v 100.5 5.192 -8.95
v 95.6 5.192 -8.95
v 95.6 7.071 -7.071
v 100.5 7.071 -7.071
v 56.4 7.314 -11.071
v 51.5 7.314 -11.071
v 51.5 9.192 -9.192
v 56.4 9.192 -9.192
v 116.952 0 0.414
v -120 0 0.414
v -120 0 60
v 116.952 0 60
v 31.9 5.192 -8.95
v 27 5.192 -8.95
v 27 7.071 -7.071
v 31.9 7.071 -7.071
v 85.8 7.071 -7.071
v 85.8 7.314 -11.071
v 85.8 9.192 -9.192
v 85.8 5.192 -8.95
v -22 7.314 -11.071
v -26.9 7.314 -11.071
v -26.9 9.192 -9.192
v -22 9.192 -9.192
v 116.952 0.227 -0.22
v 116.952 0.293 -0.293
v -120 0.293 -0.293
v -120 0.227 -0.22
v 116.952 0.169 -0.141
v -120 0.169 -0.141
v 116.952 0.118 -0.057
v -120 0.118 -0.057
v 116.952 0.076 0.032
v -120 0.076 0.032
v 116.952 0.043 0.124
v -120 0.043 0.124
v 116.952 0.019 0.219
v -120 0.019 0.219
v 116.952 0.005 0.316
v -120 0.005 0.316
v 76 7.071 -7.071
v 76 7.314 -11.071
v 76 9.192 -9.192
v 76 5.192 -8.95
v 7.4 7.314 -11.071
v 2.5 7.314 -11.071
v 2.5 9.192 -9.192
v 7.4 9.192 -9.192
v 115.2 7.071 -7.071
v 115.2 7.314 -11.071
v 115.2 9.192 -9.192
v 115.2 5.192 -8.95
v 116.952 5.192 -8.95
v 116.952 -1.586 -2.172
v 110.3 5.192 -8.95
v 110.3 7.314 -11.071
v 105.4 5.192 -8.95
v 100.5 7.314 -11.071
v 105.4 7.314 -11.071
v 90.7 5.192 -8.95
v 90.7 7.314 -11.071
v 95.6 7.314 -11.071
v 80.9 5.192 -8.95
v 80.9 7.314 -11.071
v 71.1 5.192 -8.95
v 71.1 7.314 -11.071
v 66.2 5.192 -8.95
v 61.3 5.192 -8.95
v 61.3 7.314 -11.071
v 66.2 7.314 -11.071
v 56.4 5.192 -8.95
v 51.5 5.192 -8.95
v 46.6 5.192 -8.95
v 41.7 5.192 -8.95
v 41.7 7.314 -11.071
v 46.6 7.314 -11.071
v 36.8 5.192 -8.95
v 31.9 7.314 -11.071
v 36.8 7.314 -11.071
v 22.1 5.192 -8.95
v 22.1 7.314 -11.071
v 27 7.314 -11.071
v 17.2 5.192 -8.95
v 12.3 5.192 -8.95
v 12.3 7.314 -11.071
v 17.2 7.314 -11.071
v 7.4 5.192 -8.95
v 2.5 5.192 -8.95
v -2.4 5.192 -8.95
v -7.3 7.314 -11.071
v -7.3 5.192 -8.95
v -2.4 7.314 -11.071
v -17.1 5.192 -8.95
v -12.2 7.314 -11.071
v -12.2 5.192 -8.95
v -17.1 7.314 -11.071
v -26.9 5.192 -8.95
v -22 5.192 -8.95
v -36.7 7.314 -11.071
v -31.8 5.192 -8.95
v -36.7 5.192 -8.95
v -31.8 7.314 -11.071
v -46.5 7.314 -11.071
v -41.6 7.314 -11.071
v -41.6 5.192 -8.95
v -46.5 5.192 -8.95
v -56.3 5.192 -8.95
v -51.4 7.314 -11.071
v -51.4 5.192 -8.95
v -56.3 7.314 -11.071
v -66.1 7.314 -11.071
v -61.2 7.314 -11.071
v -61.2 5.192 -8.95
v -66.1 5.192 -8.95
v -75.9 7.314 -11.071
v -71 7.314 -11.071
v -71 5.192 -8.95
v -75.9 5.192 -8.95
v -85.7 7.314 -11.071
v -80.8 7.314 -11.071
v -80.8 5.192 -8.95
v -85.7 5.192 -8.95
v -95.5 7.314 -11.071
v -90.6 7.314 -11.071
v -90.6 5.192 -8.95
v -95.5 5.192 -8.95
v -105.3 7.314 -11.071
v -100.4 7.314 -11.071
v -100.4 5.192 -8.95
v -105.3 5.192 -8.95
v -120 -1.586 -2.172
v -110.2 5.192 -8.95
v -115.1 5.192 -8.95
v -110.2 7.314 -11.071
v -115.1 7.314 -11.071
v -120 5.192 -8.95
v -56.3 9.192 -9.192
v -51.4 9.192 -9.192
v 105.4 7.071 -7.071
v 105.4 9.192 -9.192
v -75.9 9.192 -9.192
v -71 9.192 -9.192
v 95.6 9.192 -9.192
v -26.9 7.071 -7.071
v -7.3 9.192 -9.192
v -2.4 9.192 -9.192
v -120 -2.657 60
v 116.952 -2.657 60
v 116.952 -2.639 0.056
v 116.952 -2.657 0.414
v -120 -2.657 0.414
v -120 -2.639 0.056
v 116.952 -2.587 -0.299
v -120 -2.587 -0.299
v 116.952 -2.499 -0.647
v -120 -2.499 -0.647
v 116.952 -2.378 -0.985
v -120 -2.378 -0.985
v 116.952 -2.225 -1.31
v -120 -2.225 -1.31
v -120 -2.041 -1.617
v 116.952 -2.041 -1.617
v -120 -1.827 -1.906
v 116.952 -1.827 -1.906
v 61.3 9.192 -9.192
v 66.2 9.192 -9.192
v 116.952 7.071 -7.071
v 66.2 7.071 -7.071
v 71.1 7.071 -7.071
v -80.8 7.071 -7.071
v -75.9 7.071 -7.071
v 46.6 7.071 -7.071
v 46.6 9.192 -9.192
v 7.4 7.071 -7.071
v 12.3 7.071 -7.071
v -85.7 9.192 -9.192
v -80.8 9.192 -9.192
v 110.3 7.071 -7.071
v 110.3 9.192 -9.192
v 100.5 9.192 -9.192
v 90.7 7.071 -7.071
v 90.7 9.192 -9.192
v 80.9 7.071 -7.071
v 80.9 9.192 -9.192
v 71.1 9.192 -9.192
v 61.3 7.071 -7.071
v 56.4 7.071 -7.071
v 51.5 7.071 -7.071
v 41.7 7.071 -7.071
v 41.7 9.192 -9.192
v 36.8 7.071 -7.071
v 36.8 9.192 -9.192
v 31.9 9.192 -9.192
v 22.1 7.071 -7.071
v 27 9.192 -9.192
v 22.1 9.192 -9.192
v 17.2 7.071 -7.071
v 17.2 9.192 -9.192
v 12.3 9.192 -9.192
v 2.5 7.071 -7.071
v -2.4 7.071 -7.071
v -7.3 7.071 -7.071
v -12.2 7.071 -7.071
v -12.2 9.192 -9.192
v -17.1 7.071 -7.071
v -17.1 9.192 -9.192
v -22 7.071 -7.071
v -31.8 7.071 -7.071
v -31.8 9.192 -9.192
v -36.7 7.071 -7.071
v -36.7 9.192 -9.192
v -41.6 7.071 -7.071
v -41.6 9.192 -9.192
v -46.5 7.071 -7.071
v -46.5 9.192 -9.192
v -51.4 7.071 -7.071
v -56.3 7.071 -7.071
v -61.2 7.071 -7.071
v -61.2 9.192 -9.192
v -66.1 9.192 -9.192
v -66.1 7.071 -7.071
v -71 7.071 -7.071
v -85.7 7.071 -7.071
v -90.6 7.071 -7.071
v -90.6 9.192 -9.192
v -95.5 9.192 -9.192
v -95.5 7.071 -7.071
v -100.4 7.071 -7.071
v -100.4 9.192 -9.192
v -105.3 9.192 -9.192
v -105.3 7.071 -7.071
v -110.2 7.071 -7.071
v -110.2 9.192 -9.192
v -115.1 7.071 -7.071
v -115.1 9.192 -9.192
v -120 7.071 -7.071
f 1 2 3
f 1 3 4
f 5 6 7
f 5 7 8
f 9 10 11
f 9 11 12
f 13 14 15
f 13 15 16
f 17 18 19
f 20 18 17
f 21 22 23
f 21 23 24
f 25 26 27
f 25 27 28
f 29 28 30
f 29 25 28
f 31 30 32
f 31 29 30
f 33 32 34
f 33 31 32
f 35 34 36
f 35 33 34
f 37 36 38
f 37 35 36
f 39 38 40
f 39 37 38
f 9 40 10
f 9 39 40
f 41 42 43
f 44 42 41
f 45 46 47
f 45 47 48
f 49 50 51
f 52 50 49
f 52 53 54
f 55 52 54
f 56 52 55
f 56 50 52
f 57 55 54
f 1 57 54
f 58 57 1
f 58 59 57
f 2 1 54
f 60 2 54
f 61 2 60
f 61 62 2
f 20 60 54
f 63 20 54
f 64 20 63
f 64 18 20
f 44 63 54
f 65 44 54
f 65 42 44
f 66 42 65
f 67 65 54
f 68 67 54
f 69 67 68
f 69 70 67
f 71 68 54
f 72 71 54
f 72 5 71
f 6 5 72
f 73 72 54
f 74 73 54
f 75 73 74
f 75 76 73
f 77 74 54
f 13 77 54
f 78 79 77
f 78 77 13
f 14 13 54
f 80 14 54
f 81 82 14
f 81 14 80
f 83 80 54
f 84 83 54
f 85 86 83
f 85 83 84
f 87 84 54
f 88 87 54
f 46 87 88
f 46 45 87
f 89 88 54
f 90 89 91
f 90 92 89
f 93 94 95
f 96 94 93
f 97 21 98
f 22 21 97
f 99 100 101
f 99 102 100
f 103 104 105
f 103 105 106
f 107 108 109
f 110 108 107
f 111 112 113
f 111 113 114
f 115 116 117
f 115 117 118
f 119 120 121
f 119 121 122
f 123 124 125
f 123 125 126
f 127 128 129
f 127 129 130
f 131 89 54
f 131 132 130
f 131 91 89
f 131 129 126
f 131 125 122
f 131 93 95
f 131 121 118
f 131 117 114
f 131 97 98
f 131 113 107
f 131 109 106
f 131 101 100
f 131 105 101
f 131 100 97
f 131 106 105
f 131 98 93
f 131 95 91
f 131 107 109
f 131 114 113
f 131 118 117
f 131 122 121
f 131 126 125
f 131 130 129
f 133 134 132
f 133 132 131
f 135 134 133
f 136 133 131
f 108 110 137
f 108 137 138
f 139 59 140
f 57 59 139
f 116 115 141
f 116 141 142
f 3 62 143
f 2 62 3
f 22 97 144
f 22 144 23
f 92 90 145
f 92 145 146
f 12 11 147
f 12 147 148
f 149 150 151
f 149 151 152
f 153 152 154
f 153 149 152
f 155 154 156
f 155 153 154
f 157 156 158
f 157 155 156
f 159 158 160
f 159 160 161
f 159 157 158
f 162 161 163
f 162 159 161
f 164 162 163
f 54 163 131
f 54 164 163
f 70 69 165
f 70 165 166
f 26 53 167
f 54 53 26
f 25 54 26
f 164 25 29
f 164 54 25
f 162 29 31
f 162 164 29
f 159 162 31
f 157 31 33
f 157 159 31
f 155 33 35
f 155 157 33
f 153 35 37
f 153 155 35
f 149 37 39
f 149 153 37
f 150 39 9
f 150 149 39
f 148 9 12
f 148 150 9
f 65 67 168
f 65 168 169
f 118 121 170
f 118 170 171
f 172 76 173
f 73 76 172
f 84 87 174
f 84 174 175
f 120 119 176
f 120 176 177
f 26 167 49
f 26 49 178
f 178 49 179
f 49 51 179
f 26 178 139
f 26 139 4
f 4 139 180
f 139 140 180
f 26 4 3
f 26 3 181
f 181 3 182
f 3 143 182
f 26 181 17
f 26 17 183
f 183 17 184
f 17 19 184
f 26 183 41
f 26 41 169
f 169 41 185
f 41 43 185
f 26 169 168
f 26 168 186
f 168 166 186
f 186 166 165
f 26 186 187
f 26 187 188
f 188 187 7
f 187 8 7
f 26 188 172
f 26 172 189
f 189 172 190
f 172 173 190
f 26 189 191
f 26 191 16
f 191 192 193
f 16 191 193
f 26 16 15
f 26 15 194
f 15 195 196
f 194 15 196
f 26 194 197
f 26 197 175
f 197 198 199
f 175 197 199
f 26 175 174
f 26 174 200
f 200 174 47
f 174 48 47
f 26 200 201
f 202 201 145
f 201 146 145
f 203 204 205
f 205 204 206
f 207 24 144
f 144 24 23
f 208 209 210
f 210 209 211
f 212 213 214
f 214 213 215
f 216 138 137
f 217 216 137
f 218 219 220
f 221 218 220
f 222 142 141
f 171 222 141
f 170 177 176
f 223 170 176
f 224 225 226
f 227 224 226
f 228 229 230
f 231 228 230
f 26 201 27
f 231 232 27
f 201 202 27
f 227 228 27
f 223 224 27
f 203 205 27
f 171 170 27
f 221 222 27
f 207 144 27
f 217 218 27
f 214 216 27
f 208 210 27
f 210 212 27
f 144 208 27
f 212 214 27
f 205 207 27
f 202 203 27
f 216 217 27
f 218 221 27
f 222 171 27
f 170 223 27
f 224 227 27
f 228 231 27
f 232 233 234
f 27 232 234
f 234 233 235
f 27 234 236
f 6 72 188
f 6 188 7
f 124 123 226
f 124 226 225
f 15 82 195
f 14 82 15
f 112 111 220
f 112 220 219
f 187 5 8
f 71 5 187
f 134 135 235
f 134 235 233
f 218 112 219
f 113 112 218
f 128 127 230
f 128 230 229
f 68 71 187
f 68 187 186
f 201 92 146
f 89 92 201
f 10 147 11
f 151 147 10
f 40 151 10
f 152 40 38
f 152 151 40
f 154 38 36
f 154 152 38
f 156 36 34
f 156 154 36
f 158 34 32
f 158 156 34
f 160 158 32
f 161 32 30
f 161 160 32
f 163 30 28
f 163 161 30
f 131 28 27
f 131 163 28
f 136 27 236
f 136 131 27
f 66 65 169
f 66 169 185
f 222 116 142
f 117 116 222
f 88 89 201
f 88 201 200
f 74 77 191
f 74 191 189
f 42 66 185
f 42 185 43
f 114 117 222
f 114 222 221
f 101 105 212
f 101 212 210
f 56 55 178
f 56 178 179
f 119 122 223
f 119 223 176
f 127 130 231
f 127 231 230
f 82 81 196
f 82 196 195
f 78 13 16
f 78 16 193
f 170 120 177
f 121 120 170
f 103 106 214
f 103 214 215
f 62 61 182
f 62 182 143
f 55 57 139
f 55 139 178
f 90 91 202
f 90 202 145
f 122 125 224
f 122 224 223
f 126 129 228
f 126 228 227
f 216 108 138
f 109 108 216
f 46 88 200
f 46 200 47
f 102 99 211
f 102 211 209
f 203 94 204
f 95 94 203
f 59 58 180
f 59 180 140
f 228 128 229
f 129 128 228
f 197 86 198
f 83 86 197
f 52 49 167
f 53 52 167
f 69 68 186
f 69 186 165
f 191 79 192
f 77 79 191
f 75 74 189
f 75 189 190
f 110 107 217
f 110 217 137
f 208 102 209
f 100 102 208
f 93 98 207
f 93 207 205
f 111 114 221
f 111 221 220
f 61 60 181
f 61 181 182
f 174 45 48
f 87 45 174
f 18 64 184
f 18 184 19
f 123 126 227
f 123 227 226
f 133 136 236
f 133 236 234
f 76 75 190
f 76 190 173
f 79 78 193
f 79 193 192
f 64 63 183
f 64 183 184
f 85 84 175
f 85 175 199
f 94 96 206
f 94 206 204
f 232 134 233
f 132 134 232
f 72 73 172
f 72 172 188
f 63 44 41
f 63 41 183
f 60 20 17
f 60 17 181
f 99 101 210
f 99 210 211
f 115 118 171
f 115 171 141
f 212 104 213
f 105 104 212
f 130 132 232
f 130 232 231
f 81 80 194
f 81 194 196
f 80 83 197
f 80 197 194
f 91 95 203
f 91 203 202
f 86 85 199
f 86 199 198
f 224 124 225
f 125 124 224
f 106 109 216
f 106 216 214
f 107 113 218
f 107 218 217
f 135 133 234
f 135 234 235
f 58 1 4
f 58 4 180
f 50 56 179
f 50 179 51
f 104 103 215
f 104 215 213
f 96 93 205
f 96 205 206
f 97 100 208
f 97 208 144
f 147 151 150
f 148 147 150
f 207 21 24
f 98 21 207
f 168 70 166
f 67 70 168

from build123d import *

# Parameters (mm, degrees)
SKETCH1_W                    = 240
SKETCH1_H                    = 2.65684
BASE_FLANGE1_DEPTH           = 60
EDGE_FLANGE1_STRIP_CUT_DEPTH = 240
EDGE_FLANGE1_DEPTH           = 240
EDGE_FLANGE1_START           = 2.65684
EDGE_FLANGE1_FLAT_DEPTH      = 2.65684
CUT_EXTRUDE1_DEPTH           = 33.782
CUT_EXTRUDE1_DEPTH_BACK      = 23.876


# Sheet-metal steps are written as plain solids
with BuildPart() as part:
    # Sketch1 → Base-Flange1 (new body)
    with BuildSketch(Plane.XY):
        with Locations((0, -1.32842)):
            Rectangle(SKETCH1_W, SKETCH1_H)
    extrude(amount=BASE_FLANGE1_DEPTH)

    # Edge-Flange1 strip (across the edge) → Edge-Flange1 strip cut (cut)
    with BuildSketch(Plane(origin=(120, 0, 0), x_dir=(0, 0.7071067811865512, 0.7071067811865438), z_dir=(-1, 0, 0))):
        Polygon((-10.514668246, 6.757329085), (-1.585776362, -2.171562799), (0.292893219, -0.292893219), (-8.635998666, 8.635998666), align=None)
    extrude(amount=EDGE_FLANGE1_STRIP_CUT_DEPTH, mode=Mode.SUBTRACT)

    # Edge-Flange1 bend section (across the edge) → Edge-Flange1 (add)
    with BuildSketch(Plane(origin=(120, 0, 0), x_dir=(0, 0.7071067811865512, 0.7071067811865438), z_dir=(-1, 0, 0))):
        with BuildLine():
            Line((-2.65684, 0.414213562), (0, 0.414213562))
            ThreePointArc((0, 0.414213562), (0.076120467, 0.03153013), (0.292893219, -0.292893219))
            Line((0.292893219, -0.292893219), (-1.585776362, -2.171562799))
            ThreePointArc((-1.585776362, -2.171562799), (-2.37847963, -0.98519852), (-2.65684, 0.414213562))
        make_face()
    extrude(amount=EDGE_FLANGE1_DEPTH)

    # Edge-Flange1 profile (on flange) → Edge-Flange1 flat (add)
    with BuildSketch(Plane(origin=(0, 0, 0), x_dir=(-1, 0, 0), z_dir=(0, -0.7071067811865512, -0.7071067811865438)).offset(EDGE_FLANGE1_START)):
        Polygon((120, 0.414213562), (120, 10), (115.1, 10), (115.1, 13), (110.2, 13), (110.2, 10), (105.3, 10), (105.3, 13), (100.4, 13), (100.4, 10), (95.5, 10), (95.5, 13), (90.6, 13), (90.6, 10), (85.7, 10), (85.7, 13), (80.8, 13), (80.8, 10), (75.9, 10), (75.9, 13), (71, 13), (71, 10), (66.1, 10), (66.1, 13), (61.2, 13), (61.2, 10), (56.3, 10), (56.3, 13), (51.4, 13), (51.4, 10), (46.5, 10), (46.5, 13), (41.6, 13), (41.6, 10), (36.7, 10), (36.7, 13), (31.8, 13), (31.8, 10), (26.9, 10), (26.9, 13), (22, 13), (22, 10), (17.1, 10), (17.1, 13), (12.2, 13), (12.2, 10), (7.3, 10), (7.3, 13), (2.4, 13), (2.4, 10), (-2.5, 10), (-2.5, 13), (-7.4, 13), (-7.4, 10), (-12.3, 10), (-12.3, 13), (-17.2, 13), (-17.2, 10), (-22.1, 10), (-22.1, 13), (-27, 13), (-27, 10), (-31.9, 10), (-31.9, 13), (-36.8, 13), (-36.8, 10), (-41.7, 10), (-41.7, 13), (-46.6, 13), (-46.6, 10), (-51.5, 10), (-51.5, 13), (-56.4, 13), (-56.4, 10), (-61.3, 10), (-61.3, 13), (-66.2, 13), (-66.2, 10), (-71.1, 10), (-71.1, 13), (-76, 13), (-76, 10), (-80.9, 10), (-80.9, 13), (-85.8, 13), (-85.8, 10), (-90.7, 10), (-90.7, 13), (-95.6, 13), (-95.6, 10), (-100.5, 10), (-100.5, 13), (-105.4, 13), (-105.4, 10), (-110.3, 10), (-110.3, 13), (-115.2, 13), (-115.2, 10), (-120, 10), (-120, 0.414213562), align=None)
    extrude(amount=-EDGE_FLANGE1_FLAT_DEPTH)

    # Sketch9 → Cut-Extrude1 (cut, two sides: drawn at the far end of the back side and taken through both)
    with BuildSketch(Plane(origin=(0, 0, 0), x_dir=(1, 0, 0), z_dir=(0, 1, 0)).offset(-CUT_EXTRUDE1_DEPTH_BACK)):
        Polygon((120, -60), (120, 40.593867323), (116.952, 40.593867323), (116.952, -75.248845782), (120, -75.248845782), align=None)
    extrude(amount=CUT_EXTRUDE1_DEPTH + CUT_EXTRUDE1_DEPTH_BACK, mode=Mode.SUBTRACT)


solid = part.part
